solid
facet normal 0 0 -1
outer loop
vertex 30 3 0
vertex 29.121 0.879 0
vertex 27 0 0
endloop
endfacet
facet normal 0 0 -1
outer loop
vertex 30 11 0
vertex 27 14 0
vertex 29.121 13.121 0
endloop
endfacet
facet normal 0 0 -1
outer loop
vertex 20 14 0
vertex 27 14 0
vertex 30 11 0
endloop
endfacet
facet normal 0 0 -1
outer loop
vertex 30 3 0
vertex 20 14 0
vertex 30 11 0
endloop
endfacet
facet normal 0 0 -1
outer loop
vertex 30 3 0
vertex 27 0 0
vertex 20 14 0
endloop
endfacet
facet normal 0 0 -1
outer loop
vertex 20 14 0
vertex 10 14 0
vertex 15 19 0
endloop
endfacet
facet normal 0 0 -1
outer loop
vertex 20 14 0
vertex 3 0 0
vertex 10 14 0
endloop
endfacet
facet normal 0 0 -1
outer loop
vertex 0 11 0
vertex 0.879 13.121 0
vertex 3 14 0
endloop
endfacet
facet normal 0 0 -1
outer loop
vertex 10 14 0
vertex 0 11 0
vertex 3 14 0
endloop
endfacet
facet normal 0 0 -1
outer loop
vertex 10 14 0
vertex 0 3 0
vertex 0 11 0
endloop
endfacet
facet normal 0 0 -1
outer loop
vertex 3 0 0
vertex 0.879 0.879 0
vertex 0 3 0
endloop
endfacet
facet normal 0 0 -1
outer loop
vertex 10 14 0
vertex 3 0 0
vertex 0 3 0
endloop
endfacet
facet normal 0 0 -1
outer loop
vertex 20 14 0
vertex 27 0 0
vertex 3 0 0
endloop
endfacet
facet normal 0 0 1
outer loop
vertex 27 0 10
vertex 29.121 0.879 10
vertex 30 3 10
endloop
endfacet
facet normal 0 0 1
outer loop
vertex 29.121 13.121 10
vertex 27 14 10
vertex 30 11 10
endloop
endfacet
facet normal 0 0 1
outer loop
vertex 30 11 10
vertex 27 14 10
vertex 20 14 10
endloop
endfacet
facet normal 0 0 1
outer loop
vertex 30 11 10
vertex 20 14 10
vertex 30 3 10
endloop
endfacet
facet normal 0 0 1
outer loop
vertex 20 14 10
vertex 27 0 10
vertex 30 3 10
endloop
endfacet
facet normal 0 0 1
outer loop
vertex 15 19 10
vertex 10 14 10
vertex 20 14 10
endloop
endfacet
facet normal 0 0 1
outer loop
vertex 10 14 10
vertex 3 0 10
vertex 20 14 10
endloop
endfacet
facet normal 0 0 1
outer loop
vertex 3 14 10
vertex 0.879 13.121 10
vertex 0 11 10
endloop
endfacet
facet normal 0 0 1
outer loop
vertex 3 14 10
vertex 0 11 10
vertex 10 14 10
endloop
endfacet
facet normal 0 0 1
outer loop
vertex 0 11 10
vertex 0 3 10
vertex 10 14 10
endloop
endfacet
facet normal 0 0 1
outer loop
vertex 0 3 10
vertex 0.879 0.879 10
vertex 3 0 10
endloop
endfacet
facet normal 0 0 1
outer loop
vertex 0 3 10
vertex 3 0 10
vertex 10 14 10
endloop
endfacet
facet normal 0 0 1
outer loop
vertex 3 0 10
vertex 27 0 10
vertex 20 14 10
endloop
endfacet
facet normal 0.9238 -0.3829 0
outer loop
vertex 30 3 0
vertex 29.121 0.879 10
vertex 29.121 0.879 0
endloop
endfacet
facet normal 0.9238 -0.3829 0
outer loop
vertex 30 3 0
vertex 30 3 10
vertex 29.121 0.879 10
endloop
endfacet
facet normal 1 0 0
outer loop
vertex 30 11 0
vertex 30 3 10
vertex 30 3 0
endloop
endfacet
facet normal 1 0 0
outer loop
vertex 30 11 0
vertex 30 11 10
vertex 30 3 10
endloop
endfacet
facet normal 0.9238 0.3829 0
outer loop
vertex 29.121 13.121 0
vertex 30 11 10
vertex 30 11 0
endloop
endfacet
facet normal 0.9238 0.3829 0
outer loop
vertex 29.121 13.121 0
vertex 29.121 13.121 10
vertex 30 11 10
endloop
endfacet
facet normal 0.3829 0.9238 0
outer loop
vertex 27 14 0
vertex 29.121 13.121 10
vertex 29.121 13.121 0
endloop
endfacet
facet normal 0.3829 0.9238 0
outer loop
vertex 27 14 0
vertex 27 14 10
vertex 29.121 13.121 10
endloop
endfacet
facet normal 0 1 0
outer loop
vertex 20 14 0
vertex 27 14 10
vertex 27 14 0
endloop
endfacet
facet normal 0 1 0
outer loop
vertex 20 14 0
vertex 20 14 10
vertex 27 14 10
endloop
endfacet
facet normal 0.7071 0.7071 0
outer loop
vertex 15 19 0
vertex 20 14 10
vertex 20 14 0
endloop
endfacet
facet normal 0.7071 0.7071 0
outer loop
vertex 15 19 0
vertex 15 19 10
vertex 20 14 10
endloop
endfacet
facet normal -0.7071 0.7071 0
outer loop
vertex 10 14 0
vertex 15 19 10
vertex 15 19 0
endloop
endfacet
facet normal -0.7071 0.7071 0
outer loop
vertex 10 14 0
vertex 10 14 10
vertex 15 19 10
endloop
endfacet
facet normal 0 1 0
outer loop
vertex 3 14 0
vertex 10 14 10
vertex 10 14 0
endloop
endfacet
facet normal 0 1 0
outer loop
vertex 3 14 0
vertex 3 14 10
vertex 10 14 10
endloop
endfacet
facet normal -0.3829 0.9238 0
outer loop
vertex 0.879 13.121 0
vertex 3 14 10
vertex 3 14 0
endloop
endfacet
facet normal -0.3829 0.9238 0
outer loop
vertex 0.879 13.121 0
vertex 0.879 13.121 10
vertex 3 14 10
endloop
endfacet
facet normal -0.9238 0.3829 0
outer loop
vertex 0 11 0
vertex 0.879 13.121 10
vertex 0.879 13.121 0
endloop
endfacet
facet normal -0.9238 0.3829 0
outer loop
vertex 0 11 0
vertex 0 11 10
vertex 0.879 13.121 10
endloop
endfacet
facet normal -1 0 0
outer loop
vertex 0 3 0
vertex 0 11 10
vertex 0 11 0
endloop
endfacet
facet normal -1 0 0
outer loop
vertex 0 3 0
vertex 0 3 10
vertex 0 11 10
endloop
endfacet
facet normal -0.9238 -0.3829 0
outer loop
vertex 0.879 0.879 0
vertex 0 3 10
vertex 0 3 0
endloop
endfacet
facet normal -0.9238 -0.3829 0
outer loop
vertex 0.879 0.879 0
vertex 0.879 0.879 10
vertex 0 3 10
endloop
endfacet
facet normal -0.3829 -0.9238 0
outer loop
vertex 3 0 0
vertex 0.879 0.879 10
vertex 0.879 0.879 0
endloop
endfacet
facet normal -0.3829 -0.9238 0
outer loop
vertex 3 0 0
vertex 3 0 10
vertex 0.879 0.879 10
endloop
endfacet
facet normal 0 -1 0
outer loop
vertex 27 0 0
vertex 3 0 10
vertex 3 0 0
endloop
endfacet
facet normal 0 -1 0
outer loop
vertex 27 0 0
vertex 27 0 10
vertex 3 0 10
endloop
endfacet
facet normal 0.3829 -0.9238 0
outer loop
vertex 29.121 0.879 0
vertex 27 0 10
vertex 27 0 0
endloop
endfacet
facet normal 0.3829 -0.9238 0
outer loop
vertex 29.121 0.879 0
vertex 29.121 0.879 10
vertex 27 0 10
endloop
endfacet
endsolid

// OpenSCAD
$fn = 32;

// ----------------------------------------------------------------------
// Ratchet pawl: 30 x 14 mm body, beak 5 mm сверху
// ----------------------------------------------------------------------

// --- parameters (mm) ---
profile_height = 10;      // extrusion height
profile_points = 15;      // points of the closed outline

profile = [[0, 3], [0.879, 0.879], [3, 0], [27, 0], [29.121, 0.879], [30, 3], [30, 11], [29.121, 13.121], [27, 14], [20, 14], [15, 19], [10, 14], [3, 14], [0.879, 13.121], [0, 11]];  // single closed polygon, 15 points, counter clockwise

// --- the one profile operation ---
linear_extrude(height = profile_height) polygon(points = profile);
